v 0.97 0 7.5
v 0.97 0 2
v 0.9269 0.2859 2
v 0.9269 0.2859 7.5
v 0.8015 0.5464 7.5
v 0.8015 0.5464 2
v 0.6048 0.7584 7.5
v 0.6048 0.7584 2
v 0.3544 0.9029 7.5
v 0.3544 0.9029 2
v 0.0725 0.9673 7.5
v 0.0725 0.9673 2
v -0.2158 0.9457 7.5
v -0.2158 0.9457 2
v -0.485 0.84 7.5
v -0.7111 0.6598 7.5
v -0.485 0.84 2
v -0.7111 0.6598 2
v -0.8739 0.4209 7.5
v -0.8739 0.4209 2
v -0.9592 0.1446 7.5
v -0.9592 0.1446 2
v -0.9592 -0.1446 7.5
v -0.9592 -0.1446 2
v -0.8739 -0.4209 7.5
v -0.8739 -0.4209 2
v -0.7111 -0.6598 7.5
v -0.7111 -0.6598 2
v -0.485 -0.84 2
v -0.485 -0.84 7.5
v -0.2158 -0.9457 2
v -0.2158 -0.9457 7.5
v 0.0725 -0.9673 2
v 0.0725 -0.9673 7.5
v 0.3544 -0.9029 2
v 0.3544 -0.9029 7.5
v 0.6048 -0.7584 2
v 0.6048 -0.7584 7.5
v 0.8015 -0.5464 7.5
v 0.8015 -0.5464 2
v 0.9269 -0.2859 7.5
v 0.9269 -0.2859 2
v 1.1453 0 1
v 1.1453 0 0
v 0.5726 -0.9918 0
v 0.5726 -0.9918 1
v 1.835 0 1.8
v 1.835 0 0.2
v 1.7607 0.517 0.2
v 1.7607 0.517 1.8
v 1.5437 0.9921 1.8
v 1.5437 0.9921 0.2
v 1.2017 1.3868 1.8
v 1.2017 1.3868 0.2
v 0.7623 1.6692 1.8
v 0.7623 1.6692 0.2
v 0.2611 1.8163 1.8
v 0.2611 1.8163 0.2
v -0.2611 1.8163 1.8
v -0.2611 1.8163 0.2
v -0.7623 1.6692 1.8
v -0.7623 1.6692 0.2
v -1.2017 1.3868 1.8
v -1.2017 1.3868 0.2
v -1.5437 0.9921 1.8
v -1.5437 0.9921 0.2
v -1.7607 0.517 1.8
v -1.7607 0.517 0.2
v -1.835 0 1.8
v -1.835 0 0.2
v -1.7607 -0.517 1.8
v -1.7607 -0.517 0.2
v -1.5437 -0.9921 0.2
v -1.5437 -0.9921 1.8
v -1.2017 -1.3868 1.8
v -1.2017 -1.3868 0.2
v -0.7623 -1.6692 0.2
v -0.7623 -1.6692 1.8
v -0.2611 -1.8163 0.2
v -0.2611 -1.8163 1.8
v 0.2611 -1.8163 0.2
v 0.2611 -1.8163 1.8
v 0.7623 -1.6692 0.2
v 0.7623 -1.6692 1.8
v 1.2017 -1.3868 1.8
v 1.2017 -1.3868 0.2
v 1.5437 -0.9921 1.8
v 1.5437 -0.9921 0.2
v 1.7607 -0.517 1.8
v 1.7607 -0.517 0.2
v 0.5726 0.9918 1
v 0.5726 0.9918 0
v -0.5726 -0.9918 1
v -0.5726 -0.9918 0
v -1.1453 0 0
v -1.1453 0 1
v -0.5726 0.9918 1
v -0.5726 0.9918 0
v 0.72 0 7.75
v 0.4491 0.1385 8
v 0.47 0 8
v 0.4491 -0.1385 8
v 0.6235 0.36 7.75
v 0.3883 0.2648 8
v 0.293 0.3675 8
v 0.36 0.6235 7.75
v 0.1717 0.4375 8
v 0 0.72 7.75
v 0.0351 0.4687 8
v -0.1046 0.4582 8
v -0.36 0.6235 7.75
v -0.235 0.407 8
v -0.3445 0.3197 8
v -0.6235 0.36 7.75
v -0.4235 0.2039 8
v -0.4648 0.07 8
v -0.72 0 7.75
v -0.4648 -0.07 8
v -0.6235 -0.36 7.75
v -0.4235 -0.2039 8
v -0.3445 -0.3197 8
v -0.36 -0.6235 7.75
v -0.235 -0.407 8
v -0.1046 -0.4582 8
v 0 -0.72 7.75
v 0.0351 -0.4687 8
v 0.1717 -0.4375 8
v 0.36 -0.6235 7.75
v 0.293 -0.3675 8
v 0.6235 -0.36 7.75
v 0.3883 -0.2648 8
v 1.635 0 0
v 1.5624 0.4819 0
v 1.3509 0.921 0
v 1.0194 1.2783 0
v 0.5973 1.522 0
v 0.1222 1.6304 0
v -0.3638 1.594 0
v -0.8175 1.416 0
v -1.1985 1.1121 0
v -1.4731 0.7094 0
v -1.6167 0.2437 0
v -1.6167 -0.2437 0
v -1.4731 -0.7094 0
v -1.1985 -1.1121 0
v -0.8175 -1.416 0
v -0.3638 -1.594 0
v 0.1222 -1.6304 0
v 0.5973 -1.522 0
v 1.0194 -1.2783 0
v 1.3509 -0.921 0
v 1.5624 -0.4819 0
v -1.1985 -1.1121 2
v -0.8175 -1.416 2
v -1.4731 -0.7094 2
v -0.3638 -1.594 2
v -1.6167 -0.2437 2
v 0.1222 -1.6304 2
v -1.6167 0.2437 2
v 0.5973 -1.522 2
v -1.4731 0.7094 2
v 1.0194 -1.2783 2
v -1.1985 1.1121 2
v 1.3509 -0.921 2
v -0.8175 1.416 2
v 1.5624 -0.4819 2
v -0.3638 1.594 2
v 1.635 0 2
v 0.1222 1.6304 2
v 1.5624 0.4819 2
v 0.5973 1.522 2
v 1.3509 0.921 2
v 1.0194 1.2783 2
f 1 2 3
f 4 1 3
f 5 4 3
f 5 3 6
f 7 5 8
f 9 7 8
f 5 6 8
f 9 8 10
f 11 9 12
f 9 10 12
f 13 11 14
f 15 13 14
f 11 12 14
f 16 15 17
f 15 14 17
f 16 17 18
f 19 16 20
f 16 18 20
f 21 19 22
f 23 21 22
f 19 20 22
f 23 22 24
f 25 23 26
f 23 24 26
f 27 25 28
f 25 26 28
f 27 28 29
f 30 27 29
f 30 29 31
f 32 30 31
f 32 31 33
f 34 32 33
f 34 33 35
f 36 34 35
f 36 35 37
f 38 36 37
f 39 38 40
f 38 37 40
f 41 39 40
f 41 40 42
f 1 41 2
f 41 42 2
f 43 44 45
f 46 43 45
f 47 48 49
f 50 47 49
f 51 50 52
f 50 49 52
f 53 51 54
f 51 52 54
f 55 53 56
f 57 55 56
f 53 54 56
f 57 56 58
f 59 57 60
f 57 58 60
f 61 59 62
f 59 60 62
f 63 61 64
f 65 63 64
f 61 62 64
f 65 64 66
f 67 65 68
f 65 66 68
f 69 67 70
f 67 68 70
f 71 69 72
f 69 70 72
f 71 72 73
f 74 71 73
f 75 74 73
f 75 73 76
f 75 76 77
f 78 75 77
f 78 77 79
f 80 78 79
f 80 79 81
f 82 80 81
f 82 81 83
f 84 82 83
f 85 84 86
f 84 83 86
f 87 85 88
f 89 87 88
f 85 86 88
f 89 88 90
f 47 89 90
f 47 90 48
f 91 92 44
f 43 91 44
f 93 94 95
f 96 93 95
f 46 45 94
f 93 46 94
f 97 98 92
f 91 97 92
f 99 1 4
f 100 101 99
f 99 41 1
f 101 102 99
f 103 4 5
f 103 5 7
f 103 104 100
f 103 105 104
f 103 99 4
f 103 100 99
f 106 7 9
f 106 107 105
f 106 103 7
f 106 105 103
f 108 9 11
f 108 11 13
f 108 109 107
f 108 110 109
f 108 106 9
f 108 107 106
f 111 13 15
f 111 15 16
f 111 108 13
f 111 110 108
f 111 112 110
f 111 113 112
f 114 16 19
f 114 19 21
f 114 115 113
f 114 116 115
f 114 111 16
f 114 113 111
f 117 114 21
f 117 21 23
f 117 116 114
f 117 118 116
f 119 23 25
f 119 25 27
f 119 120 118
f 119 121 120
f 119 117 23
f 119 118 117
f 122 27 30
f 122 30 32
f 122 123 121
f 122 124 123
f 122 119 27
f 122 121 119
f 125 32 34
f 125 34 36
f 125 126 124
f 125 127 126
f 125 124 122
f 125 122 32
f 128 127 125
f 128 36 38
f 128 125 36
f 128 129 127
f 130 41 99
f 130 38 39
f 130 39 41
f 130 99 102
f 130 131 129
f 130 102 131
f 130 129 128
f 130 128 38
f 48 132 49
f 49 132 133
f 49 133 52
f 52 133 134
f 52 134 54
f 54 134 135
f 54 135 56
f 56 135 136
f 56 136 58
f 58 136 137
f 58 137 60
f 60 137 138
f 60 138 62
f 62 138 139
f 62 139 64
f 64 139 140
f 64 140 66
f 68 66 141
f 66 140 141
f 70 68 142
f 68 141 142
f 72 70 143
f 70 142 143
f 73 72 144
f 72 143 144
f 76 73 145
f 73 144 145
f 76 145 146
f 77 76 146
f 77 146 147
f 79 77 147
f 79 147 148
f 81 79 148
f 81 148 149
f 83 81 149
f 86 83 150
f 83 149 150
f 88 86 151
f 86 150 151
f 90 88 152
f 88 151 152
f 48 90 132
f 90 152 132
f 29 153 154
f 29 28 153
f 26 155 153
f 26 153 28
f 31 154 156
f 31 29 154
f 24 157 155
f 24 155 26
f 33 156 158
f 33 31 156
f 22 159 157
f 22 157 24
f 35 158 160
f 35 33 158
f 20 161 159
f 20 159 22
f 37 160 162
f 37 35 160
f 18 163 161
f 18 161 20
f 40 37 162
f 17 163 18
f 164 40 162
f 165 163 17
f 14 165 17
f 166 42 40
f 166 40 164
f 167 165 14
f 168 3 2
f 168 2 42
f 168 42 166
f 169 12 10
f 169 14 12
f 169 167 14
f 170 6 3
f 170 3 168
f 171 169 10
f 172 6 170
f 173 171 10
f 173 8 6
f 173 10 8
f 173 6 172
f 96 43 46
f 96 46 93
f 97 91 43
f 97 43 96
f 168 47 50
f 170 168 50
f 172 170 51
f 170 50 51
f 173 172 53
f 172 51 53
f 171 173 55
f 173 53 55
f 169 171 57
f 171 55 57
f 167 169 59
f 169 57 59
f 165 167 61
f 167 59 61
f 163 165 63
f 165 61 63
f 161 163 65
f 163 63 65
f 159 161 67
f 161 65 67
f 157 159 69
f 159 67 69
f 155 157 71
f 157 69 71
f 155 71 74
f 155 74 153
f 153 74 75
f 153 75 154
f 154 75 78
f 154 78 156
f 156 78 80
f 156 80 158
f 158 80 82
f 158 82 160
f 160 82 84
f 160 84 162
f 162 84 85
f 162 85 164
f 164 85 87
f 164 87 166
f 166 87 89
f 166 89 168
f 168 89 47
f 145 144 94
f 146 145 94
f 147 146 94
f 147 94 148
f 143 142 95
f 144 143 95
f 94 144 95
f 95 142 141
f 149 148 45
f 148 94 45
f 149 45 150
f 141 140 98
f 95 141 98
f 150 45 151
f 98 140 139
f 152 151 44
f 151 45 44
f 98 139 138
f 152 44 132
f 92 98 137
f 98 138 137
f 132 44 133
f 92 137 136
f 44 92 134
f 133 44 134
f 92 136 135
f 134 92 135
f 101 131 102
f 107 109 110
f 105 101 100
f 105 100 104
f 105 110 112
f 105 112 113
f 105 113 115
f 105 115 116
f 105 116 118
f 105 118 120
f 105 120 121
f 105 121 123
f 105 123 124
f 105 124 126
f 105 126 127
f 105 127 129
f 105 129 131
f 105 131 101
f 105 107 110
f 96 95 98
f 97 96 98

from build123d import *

# Parameters (mm, degrees)
SKETCH3_R           = 1.835
BOSS_EXTRUDE1_DEPTH = 2
SKETCH4_R           = 0.97
BOSS_EXTRUDE2_DEPTH = 6
CHAMFER1_SIZE       = 0.5
CUT_EXTRUDE1_DEPTH  = 1
CHAMFER2_SIZE       = 0.2


with BuildPart() as part:
    # Sketch3 → Boss-Extrude1 (new body)
    with BuildSketch(Plane.XY):
        Circle(SKETCH3_R)
    extrude(amount=BOSS_EXTRUDE1_DEPTH)

    # Sketch4 → Boss-Extrude2 (add)
    with BuildSketch(Plane.XY.offset(2)):
        Circle(SKETCH4_R)
    extrude(amount=BOSS_EXTRUDE2_DEPTH)

    # Chamfer1
    chamfer1_edges = [part.edges().sort_by_distance(p)[0] for p in [
        (-0.97, 0, 8),
    ]]
    chamfer(chamfer1_edges, length=CHAMFER1_SIZE)

    # Sketch5 → Cut-Extrude1 (cut)
    with BuildSketch(Plane(origin=(0, 0, 0), x_dir=(-1, 0, 0), z_dir=(0, 0, -1))):
        Polygon((1.145251225, 0), (0.572625613, 0.991816655), (-0.572625613, 0.991816655), (-1.145251225, 0), (-0.572625613, -0.991816655), (0.572625613, -0.991816655), align=None)
    extrude(amount=-CUT_EXTRUDE1_DEPTH, mode=Mode.SUBTRACT)

    # Chamfer2
    chamfer2_edges = [part.edges().sort_by_distance(p)[0] for p in [
        (-1.835, 0, 0),
        (-1.835, 0, 2),
    ]]
    chamfer(chamfer2_edges, length=CHAMFER2_SIZE)


solid = part.part
